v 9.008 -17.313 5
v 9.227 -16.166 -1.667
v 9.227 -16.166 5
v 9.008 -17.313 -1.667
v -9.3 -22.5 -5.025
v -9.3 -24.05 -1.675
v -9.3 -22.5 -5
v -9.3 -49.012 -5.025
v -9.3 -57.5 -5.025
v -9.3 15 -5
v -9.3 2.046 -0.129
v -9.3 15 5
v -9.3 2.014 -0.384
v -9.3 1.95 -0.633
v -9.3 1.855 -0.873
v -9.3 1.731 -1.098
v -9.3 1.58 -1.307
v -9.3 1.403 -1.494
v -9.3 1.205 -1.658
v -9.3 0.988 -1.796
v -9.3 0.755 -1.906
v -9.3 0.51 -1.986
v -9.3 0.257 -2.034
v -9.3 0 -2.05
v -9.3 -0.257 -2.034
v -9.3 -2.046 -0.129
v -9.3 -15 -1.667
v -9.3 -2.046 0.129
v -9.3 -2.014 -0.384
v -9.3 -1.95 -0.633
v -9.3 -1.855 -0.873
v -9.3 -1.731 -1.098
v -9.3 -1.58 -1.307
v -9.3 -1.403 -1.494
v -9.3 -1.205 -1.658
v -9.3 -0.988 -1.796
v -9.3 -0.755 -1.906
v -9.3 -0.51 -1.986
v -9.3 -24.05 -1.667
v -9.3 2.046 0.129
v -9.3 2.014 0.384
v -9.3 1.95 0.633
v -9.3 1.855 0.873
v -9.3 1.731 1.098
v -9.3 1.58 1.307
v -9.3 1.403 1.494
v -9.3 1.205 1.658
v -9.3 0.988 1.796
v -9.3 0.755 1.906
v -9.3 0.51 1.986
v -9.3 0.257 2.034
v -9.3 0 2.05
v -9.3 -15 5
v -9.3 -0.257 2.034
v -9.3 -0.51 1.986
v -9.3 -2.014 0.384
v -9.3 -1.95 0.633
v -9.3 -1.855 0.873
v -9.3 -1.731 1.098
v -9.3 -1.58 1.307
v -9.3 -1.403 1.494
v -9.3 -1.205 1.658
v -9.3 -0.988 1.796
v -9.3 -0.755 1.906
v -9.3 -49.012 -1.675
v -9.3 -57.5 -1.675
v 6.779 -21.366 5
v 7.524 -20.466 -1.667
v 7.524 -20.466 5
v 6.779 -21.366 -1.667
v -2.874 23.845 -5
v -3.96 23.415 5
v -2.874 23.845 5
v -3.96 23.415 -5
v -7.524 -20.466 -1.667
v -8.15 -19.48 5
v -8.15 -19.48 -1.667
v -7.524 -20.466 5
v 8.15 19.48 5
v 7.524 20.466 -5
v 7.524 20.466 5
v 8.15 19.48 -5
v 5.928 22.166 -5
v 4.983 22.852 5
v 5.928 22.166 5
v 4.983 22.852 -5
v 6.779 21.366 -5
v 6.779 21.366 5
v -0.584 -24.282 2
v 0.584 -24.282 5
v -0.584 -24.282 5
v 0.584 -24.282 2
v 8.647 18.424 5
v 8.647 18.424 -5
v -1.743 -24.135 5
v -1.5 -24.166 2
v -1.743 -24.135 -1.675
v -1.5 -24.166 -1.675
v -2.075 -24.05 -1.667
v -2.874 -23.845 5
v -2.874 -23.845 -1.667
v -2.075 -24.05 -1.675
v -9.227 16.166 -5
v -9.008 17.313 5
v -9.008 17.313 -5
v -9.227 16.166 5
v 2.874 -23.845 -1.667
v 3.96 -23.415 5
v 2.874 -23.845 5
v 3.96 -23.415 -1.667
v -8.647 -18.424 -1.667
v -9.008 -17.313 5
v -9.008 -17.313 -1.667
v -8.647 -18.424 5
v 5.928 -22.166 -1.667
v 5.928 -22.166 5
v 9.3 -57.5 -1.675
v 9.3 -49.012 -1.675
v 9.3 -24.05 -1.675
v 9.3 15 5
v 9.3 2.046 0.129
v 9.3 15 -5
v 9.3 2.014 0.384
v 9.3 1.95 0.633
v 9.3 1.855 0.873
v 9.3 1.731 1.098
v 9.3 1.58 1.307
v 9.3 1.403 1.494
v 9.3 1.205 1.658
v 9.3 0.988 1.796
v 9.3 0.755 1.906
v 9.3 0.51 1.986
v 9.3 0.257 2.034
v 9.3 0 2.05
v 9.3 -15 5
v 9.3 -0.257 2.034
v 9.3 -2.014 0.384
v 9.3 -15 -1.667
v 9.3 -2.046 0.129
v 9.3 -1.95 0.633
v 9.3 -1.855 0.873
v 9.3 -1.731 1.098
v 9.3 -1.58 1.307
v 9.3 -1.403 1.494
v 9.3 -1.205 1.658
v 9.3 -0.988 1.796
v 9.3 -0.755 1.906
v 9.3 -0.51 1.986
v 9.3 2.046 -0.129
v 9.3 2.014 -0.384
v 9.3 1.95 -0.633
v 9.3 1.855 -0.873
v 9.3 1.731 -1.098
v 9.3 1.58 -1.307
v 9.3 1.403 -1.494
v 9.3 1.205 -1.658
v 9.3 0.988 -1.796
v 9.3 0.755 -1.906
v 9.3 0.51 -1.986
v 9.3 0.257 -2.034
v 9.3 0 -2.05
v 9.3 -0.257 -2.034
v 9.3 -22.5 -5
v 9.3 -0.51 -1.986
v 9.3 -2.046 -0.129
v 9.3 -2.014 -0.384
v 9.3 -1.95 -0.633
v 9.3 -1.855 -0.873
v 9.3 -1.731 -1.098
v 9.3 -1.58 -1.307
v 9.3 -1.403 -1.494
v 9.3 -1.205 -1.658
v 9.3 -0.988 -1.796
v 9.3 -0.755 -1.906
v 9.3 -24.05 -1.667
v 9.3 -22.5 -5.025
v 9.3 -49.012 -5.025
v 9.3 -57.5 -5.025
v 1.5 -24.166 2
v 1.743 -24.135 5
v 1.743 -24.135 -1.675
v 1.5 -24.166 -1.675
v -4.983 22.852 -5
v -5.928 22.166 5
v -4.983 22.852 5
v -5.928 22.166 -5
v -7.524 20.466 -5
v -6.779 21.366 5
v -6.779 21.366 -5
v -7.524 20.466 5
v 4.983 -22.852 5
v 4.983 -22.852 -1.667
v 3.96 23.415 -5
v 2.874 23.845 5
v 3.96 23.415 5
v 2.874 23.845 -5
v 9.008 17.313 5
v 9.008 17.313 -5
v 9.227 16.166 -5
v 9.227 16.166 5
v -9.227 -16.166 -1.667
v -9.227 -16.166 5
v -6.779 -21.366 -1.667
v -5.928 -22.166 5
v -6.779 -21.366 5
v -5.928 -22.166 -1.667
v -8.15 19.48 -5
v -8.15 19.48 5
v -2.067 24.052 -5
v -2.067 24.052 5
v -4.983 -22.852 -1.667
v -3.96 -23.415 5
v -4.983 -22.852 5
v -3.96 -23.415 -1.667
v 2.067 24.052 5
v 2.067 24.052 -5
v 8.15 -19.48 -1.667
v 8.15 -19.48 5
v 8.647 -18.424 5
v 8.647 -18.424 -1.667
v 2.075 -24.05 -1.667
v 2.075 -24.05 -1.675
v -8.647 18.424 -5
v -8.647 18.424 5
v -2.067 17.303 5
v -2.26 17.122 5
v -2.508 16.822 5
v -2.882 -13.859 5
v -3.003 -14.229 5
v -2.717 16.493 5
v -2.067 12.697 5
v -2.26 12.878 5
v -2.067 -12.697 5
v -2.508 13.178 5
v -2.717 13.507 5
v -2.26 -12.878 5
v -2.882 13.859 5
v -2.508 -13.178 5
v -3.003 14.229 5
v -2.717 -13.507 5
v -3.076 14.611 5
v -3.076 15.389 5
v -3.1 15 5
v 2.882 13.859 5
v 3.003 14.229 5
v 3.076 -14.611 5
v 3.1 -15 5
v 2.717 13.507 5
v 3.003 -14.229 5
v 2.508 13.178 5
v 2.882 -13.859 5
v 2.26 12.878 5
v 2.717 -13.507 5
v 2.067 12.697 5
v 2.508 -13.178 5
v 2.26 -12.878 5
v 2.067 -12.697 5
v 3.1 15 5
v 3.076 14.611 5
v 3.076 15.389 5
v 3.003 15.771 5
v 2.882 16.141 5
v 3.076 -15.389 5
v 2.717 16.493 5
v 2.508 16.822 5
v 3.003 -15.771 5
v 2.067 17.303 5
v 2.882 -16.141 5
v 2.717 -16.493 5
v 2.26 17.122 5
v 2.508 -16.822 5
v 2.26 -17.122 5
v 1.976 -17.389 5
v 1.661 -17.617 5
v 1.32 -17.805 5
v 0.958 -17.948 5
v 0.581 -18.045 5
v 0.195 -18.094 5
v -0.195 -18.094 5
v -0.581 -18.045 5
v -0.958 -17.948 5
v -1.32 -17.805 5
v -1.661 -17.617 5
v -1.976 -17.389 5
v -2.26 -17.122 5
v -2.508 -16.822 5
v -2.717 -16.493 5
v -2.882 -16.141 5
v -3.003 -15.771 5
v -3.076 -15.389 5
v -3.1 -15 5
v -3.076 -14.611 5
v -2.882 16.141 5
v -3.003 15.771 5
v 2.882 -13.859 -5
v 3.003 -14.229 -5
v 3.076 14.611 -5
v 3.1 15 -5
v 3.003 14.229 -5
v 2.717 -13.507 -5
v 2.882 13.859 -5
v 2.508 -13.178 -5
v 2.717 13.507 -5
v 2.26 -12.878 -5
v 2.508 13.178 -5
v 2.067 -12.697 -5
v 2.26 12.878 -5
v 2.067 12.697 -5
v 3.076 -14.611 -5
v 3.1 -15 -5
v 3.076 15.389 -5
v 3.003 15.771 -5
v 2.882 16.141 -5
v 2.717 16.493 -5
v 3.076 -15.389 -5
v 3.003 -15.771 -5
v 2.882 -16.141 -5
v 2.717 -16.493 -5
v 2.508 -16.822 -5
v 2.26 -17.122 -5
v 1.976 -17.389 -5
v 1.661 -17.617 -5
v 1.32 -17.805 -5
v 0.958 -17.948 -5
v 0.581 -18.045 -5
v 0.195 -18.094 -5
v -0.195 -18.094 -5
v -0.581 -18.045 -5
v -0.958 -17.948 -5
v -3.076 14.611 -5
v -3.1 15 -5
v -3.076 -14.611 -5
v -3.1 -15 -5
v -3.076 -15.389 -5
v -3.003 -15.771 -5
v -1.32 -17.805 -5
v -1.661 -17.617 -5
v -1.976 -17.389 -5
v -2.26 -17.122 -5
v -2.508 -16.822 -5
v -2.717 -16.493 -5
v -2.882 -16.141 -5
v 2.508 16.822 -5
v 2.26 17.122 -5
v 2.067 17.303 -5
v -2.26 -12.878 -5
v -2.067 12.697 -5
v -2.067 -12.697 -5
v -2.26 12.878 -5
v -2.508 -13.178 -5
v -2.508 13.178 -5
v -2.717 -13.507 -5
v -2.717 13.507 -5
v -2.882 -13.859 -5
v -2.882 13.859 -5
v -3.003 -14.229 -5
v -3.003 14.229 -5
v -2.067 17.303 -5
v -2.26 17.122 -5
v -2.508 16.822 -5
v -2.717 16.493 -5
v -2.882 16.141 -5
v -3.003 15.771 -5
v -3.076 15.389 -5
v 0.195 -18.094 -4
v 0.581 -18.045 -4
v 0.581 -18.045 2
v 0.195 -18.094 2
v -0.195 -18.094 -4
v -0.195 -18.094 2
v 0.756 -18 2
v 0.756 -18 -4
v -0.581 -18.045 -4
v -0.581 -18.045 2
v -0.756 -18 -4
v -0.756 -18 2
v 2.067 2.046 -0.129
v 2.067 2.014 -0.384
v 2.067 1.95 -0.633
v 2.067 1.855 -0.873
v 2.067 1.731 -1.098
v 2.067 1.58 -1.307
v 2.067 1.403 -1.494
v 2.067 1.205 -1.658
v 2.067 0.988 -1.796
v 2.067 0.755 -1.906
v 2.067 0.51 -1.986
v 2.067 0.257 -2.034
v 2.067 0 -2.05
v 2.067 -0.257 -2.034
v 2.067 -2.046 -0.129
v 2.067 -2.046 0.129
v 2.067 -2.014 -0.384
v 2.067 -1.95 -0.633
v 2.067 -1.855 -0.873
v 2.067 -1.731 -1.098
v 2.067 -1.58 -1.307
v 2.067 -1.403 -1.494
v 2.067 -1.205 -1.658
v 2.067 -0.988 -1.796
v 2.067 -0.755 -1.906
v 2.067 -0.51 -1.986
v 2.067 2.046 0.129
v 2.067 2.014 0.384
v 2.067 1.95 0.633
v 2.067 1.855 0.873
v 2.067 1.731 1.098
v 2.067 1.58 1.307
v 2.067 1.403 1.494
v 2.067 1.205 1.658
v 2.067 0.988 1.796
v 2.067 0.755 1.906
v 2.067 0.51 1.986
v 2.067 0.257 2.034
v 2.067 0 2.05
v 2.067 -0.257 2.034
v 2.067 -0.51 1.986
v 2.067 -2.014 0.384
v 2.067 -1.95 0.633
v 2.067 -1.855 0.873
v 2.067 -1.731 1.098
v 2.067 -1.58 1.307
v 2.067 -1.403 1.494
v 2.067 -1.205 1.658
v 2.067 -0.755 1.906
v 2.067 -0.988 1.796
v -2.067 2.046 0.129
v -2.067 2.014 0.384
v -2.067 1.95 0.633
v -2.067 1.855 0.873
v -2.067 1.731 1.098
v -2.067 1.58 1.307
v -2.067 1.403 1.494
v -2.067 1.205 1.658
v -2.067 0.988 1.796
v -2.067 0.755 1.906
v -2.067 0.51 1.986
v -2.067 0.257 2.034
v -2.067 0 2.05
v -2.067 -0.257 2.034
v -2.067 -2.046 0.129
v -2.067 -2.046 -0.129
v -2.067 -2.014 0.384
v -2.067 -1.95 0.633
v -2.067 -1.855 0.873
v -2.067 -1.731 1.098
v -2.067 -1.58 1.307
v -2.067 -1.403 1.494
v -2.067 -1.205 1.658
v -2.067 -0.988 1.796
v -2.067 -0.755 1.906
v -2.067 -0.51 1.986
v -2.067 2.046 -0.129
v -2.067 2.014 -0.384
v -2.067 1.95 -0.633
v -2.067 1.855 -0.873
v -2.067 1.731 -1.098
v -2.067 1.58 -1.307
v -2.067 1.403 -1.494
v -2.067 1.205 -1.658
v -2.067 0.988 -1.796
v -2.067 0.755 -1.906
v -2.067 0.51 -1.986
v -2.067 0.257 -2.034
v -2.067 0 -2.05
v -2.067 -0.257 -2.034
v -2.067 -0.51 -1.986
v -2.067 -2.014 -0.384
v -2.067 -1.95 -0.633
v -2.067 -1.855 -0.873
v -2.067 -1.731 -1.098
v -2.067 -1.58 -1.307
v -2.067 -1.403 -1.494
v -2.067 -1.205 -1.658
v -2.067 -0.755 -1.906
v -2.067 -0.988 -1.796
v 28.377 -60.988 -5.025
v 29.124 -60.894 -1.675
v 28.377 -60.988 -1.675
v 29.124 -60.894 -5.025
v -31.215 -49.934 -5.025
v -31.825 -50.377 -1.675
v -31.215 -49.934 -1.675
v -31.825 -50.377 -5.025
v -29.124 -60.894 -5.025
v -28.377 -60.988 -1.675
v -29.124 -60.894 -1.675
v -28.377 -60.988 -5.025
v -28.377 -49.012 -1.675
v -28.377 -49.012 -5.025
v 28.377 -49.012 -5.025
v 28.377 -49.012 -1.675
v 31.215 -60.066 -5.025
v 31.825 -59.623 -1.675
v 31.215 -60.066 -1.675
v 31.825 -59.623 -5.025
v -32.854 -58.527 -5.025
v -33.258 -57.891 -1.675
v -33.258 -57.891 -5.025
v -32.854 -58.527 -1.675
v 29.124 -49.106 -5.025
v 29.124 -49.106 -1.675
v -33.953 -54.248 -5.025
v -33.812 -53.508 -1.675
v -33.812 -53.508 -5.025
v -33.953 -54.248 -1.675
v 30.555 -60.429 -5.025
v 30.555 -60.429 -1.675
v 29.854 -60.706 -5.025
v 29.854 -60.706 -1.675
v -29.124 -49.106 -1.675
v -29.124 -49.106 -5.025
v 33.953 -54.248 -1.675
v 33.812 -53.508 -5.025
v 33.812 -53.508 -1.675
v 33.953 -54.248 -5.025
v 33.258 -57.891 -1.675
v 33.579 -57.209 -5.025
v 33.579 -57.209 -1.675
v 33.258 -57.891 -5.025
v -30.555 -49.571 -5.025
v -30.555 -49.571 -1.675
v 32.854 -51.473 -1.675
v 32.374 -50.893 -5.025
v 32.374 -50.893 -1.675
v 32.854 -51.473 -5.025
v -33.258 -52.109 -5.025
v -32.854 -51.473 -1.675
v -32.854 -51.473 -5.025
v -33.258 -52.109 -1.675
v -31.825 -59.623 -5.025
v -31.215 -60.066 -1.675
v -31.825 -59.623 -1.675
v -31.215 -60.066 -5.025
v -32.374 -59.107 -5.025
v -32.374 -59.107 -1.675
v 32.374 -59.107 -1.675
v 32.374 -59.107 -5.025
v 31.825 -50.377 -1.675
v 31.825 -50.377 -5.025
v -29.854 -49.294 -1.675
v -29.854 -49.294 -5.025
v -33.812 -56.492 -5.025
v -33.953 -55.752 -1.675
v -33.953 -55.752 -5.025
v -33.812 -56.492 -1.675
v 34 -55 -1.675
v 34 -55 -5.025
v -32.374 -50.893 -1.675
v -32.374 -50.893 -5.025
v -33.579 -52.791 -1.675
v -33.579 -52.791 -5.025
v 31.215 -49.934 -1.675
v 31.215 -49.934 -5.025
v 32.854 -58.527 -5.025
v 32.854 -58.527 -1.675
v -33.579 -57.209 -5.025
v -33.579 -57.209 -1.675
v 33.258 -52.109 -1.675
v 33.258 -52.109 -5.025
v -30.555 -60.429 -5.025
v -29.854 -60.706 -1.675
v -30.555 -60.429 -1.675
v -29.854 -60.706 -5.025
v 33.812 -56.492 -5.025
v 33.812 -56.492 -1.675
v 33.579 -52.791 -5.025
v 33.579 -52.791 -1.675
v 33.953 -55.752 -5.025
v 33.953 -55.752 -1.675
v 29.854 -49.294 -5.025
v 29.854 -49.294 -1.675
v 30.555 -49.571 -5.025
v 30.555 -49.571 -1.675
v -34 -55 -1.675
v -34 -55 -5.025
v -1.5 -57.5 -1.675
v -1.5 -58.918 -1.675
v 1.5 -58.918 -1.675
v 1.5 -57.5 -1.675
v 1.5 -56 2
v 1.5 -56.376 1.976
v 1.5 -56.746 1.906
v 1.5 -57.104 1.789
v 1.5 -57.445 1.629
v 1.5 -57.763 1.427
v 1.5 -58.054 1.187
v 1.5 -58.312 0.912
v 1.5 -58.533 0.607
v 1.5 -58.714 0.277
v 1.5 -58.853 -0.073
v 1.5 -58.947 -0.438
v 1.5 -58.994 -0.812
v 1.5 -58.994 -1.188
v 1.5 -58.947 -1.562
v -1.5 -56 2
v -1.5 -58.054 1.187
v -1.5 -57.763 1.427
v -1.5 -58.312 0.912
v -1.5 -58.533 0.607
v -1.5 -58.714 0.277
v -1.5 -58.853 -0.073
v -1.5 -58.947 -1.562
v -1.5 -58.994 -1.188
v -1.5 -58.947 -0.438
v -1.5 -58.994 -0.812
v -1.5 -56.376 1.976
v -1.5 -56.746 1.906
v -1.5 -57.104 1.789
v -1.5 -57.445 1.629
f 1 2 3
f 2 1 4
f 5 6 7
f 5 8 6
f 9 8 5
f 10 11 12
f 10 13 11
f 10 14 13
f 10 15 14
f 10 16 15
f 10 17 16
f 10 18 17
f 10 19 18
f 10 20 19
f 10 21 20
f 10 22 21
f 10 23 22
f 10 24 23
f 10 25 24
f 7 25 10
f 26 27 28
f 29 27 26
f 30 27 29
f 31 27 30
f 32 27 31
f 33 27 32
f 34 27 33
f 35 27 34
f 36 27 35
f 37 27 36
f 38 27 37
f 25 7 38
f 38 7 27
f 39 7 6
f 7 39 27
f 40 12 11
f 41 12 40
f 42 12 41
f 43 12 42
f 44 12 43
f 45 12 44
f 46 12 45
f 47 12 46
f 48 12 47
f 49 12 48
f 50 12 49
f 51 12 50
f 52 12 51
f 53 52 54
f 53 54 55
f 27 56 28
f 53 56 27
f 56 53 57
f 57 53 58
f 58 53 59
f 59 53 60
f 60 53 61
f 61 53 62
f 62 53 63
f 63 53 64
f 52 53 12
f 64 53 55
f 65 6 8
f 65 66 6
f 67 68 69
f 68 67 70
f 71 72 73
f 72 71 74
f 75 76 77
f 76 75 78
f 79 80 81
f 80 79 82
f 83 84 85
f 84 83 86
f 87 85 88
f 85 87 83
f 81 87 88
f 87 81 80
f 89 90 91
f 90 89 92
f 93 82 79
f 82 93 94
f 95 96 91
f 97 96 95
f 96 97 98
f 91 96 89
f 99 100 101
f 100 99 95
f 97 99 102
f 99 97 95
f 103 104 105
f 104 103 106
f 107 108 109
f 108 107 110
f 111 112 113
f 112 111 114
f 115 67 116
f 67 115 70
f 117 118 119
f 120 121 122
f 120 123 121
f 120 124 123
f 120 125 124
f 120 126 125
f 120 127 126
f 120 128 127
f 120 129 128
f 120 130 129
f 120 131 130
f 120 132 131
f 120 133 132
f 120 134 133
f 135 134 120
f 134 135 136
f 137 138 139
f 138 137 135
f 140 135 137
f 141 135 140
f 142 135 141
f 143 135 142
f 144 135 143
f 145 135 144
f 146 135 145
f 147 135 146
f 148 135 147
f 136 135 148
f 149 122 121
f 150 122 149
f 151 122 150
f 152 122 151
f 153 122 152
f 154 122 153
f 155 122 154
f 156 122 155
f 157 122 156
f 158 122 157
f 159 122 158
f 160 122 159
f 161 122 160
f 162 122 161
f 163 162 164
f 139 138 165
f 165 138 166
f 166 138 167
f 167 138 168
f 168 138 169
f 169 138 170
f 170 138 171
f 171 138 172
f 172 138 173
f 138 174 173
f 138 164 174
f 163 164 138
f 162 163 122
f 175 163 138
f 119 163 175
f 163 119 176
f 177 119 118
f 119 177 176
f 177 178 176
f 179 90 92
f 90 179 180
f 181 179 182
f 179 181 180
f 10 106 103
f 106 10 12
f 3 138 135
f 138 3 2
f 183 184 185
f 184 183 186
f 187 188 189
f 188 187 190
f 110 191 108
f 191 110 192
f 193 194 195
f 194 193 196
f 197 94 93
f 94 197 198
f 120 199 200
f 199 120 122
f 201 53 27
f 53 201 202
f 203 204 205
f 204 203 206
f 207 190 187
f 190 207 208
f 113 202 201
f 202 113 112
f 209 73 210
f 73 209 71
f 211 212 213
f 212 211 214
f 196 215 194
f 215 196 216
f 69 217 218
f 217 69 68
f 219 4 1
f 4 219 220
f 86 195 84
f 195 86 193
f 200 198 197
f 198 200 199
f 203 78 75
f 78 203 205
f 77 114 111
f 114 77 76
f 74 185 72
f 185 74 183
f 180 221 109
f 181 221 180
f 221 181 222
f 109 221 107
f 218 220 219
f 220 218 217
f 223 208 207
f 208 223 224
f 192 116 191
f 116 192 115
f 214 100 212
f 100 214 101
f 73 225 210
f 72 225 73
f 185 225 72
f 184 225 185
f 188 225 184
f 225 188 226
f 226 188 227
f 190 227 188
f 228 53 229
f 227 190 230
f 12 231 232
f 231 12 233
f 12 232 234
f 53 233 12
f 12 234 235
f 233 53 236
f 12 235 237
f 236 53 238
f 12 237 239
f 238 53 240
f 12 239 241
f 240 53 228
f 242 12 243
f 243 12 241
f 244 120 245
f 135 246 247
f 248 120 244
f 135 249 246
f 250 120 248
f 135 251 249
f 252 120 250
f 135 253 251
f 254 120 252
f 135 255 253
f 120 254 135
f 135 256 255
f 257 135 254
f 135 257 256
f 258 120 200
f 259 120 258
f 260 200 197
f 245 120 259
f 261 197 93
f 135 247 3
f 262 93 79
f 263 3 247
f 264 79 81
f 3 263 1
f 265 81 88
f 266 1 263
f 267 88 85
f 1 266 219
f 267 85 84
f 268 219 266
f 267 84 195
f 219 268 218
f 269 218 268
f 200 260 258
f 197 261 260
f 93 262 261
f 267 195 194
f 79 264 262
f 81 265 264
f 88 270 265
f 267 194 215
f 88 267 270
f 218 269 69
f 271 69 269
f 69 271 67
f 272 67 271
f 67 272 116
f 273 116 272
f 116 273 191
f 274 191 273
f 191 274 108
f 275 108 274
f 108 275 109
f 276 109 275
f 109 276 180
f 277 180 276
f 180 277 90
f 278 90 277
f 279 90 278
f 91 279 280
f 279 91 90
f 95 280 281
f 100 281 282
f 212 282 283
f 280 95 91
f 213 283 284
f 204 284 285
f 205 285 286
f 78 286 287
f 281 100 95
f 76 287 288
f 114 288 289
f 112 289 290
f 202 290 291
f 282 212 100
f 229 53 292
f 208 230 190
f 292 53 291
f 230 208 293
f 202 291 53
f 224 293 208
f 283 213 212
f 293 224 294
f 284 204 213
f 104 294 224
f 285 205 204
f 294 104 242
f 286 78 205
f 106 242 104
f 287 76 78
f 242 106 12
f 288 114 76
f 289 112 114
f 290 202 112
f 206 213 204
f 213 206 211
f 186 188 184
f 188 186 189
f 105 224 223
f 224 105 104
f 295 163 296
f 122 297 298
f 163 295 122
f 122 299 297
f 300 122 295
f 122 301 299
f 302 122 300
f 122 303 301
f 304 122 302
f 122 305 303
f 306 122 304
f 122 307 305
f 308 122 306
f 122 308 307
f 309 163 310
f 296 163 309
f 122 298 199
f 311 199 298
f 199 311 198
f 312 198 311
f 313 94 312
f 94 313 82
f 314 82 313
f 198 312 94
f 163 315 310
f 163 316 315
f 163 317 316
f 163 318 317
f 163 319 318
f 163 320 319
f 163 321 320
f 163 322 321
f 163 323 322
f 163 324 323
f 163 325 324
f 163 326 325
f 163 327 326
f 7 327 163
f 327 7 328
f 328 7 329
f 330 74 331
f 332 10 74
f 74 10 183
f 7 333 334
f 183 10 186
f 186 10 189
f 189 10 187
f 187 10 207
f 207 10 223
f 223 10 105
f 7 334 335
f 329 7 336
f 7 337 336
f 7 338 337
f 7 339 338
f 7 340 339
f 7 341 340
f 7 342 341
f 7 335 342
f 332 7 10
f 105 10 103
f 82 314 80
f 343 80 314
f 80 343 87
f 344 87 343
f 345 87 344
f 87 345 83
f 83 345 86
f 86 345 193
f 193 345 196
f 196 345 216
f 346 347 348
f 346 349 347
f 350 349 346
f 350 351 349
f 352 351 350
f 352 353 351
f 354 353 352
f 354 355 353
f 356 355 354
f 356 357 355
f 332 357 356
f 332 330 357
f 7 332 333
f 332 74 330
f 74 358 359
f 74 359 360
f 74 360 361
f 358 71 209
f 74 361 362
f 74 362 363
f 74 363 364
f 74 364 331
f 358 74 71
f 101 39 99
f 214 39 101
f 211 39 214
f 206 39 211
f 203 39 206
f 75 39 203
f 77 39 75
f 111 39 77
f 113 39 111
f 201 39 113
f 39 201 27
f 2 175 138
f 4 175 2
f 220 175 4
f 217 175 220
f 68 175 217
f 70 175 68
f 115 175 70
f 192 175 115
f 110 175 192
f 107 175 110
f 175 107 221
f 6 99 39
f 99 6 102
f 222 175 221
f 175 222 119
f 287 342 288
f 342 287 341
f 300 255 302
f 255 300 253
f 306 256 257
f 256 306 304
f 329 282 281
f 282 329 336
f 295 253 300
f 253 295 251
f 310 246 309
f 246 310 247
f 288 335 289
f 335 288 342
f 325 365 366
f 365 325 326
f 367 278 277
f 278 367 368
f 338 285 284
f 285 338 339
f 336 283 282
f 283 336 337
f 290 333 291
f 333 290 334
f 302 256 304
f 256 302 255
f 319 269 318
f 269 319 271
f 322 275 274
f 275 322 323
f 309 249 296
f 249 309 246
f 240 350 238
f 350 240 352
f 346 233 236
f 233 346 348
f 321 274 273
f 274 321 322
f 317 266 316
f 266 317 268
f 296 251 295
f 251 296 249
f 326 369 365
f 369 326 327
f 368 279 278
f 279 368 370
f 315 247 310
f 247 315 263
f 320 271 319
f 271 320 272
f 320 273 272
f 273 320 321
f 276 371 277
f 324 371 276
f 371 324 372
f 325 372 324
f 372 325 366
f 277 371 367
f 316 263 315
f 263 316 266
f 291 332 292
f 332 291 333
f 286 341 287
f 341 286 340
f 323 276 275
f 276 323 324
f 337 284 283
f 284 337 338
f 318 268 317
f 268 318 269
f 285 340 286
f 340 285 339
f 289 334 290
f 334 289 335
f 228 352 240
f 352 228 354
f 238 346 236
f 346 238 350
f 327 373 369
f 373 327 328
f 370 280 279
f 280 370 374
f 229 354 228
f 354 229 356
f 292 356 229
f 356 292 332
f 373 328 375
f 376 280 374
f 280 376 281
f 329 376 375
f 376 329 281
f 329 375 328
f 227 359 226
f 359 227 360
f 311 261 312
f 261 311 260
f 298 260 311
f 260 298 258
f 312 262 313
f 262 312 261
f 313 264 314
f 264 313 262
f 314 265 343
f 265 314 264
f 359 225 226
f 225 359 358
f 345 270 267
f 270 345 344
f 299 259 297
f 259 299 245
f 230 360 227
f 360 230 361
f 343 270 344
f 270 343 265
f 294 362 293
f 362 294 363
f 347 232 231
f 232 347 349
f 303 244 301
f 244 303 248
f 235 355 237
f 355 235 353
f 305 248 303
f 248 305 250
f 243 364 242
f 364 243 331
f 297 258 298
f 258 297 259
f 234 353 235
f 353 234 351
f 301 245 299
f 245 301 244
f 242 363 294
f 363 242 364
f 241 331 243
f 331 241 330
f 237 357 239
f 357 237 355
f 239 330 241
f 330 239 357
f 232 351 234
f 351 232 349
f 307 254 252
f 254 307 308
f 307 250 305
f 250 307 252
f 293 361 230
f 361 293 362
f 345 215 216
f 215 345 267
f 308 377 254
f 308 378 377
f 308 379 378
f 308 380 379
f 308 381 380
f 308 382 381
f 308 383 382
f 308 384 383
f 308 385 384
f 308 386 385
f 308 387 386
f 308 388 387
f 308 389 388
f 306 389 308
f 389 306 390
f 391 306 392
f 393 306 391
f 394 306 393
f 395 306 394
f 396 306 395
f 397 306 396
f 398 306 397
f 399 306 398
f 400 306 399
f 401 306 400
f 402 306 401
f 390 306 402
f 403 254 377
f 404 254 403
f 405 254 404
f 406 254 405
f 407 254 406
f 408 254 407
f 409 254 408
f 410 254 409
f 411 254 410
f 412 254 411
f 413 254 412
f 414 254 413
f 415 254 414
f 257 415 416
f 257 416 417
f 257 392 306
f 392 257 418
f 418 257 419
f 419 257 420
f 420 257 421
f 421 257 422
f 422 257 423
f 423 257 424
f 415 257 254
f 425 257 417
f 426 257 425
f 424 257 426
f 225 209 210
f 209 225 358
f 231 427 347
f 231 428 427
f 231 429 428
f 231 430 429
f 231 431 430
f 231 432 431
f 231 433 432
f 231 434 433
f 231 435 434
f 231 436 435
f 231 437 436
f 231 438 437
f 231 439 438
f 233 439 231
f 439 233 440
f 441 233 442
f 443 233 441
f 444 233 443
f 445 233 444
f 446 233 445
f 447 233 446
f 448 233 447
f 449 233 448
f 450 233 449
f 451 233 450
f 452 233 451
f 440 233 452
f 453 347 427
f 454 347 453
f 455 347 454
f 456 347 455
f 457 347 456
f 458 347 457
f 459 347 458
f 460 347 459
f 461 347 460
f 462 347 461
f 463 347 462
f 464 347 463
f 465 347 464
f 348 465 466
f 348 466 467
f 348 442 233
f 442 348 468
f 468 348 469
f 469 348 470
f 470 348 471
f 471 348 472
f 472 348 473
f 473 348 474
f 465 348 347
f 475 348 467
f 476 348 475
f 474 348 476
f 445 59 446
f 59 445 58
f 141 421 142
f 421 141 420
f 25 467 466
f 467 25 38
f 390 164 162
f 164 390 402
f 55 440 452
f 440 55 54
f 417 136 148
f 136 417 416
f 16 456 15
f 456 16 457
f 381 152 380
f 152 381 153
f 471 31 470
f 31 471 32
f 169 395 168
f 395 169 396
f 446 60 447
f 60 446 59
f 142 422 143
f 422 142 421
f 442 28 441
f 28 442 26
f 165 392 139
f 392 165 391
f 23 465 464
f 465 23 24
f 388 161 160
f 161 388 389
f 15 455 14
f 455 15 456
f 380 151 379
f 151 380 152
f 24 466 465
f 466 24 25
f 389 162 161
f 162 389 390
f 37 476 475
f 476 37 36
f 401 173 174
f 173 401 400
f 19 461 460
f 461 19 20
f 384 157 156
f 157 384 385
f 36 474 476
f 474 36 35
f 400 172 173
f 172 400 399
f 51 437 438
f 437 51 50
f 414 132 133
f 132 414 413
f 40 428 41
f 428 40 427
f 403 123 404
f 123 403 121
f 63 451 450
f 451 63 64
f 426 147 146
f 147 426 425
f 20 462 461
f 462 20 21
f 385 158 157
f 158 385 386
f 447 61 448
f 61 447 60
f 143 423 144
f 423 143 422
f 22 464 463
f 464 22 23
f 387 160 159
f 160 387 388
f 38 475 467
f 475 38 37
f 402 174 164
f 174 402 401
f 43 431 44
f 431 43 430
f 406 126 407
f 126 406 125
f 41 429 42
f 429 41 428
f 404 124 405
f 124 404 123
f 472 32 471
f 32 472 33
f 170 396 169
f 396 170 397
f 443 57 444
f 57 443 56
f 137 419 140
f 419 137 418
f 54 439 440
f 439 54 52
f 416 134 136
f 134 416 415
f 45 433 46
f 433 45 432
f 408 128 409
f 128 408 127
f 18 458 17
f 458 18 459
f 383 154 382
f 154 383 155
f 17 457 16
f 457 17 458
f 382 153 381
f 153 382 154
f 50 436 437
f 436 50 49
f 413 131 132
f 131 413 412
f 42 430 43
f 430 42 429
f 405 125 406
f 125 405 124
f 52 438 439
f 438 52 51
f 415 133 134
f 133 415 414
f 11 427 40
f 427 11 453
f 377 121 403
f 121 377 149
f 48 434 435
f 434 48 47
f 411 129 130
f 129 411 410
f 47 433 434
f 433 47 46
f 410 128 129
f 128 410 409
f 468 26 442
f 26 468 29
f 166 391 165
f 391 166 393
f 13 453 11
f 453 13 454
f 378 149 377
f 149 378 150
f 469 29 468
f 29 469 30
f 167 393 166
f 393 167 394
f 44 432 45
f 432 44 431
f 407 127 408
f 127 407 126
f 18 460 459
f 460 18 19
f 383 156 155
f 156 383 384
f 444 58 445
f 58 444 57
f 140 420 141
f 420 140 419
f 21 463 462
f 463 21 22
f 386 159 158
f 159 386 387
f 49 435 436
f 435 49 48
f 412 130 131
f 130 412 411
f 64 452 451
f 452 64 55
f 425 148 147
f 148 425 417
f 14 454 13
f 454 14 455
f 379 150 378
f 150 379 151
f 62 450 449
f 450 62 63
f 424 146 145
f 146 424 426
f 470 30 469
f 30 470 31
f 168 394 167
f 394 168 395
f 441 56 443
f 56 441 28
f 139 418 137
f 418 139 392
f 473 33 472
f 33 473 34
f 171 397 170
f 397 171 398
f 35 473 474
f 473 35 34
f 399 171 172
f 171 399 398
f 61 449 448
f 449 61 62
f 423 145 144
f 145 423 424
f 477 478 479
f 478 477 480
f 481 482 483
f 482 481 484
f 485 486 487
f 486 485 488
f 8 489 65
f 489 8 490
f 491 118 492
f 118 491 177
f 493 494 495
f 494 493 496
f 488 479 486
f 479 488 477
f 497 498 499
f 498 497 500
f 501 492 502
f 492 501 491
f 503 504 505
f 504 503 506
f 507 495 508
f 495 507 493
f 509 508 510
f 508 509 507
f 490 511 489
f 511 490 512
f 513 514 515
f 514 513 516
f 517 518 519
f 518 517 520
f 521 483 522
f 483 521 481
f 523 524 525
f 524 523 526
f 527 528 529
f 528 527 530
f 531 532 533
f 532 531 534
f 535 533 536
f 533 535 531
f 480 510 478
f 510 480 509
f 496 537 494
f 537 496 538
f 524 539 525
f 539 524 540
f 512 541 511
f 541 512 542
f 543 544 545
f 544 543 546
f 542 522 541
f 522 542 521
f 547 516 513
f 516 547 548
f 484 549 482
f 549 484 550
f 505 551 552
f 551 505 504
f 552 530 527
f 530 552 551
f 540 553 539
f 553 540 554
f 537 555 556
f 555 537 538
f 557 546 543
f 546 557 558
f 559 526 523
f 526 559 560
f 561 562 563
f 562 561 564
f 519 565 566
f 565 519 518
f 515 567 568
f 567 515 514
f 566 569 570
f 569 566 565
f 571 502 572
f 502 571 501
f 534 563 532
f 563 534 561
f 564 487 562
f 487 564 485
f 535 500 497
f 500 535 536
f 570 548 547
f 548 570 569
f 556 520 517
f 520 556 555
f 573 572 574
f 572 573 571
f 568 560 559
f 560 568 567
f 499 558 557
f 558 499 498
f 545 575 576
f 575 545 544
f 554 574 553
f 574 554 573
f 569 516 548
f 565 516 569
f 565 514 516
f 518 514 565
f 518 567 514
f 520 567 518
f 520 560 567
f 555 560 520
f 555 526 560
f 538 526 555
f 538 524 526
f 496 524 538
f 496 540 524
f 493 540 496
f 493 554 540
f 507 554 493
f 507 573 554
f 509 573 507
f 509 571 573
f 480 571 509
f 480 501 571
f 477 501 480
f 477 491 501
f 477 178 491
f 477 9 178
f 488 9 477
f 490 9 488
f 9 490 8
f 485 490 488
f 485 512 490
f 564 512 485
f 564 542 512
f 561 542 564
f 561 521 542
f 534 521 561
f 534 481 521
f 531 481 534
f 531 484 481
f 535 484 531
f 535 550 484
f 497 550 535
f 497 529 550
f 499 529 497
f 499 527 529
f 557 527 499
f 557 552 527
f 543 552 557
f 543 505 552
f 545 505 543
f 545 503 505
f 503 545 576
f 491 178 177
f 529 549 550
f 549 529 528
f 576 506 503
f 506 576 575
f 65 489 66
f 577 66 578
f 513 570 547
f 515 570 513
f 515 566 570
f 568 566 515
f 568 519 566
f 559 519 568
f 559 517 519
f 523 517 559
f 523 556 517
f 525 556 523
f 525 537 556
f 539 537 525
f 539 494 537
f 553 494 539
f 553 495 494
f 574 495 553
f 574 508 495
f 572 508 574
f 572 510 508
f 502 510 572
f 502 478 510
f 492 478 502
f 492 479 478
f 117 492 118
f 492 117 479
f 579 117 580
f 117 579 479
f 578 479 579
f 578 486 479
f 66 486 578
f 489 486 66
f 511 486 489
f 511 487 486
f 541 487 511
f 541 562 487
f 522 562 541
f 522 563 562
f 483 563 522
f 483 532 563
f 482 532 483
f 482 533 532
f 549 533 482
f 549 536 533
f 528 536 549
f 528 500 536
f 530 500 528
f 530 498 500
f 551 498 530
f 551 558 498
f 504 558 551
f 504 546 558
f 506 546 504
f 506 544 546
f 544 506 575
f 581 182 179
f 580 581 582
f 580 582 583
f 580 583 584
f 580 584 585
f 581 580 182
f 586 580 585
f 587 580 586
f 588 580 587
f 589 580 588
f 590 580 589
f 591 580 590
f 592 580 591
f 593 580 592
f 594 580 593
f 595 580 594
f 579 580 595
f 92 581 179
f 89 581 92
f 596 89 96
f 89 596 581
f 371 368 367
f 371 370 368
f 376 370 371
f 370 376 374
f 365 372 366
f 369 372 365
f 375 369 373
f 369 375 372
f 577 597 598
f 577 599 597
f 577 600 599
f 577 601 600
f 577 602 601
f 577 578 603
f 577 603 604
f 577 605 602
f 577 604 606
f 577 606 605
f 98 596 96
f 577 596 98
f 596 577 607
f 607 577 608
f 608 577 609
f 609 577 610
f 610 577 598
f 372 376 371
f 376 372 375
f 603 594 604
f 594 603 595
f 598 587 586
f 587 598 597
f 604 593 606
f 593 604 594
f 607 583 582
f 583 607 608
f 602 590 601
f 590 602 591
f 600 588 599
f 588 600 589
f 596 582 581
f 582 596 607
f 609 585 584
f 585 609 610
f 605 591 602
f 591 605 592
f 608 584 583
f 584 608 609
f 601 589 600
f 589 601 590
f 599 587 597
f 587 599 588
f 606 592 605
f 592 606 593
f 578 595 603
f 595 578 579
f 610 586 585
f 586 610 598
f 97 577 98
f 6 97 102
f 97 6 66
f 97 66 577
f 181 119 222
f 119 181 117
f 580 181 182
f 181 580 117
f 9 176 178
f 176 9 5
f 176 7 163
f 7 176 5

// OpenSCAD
// file: prise_carte_SENSIVIC.scad
$fn = 50;
module prise_carte_SENSIVIC($d,$e,$E,$p){
	difference(){
		union(){
			hull(){
				translate([-$E/2,0,0]){cylinder(d = 3*$d, h = $e, center = true);}
				translate([ $E/2,0,0]){cylinder(d = 3*$d, h = $e, center = true);}
			}
            hull(){
				translate([-$E/2,  0,0]){cylinder(d = 3*$d, h = $e, center = true);}
				translate([-$E/2,-$p,0]){cylinder(d = 3*$d, h = $e, center = true);}
			}
            hull(){
				translate([$E/2,  0,0]){cylinder(d = 3*$d, h = $e, center = true);}
				translate([$E/2,-$p,0]){cylinder(d = 3*$d, h = $e, center = true);}
			}           
		}
		union(){
			translate([-$E/2,-$p,-1]){cylinder(d = $d, h = 3*$e+3, center = true);}
			translate([ $E/2,-$p,-1]){cylinder(d = $d, h = 3*$e+3, center = true);}
		}
	}
}

//prise_carte_SENSIVIC(5,3,56,20);
// file: pince_plate.scad
	$fn = 50;

//	pince plate
//		$d1 : diametre des tiges du support
//		$d2 : diametre du trou de la vis de serrage
//		$e  : épaisseur de la pince
//		$E	: écartement des tiges du suppoet

module pince_plate ($d1,$d2,$e,$E) {
	difference() {
		union(){
			hull(){
				translate([0,-$E/2,0]){cylinder(d = 3*$d1, h = $e, center = true);}
				translate([0, $E/2,0]){cylinder(d = 3*$d1, h = $e, center = true);}	
			}
			translate([0,-$E/2,-($e/2-$e/6)]){cube([3*$d1,($E+$d1)/2,$e/3], center = true);}
		}
		union () {
			translate([0,-$E/2,-1]){cylinder(d = $d1, h = $e+3, center = true);}
			translate([0, $E/2,-1]){cylinder(d = $d1, h = $e+3, center = true);}
			translate([0, $d1,-1]){cube([$d1/1.5,$E+2*$d1,$e+3], center = true);}
			rotate([0,90,0]) {cylinder(d = $d2, h = 3*$d1+3, center = true);}
		}
	}
}

//pince_plate(6.2,4.1,10,30);
// main file
include <pince_plate.scad>
include <prise_carte_SENSIVIC.scad>

pince_plate(6.2,4.1,10,30);
translate([0,-55,-3.35]){
	prise_carte_SENSIVIC(4,3.35,56);
}

// liaison
translate([0,-40,-3.35]){
	cube([3*6.2,35,3.35], center = true);
}

// raidisseur
translate([0,-37,-1]){
	union(){
		cube([3,38,6], center = true);
		translate([0,-19,0]){rotate([0,90,0]){cylinder(d = 6,h = 3, center = true);}}
	}
}
